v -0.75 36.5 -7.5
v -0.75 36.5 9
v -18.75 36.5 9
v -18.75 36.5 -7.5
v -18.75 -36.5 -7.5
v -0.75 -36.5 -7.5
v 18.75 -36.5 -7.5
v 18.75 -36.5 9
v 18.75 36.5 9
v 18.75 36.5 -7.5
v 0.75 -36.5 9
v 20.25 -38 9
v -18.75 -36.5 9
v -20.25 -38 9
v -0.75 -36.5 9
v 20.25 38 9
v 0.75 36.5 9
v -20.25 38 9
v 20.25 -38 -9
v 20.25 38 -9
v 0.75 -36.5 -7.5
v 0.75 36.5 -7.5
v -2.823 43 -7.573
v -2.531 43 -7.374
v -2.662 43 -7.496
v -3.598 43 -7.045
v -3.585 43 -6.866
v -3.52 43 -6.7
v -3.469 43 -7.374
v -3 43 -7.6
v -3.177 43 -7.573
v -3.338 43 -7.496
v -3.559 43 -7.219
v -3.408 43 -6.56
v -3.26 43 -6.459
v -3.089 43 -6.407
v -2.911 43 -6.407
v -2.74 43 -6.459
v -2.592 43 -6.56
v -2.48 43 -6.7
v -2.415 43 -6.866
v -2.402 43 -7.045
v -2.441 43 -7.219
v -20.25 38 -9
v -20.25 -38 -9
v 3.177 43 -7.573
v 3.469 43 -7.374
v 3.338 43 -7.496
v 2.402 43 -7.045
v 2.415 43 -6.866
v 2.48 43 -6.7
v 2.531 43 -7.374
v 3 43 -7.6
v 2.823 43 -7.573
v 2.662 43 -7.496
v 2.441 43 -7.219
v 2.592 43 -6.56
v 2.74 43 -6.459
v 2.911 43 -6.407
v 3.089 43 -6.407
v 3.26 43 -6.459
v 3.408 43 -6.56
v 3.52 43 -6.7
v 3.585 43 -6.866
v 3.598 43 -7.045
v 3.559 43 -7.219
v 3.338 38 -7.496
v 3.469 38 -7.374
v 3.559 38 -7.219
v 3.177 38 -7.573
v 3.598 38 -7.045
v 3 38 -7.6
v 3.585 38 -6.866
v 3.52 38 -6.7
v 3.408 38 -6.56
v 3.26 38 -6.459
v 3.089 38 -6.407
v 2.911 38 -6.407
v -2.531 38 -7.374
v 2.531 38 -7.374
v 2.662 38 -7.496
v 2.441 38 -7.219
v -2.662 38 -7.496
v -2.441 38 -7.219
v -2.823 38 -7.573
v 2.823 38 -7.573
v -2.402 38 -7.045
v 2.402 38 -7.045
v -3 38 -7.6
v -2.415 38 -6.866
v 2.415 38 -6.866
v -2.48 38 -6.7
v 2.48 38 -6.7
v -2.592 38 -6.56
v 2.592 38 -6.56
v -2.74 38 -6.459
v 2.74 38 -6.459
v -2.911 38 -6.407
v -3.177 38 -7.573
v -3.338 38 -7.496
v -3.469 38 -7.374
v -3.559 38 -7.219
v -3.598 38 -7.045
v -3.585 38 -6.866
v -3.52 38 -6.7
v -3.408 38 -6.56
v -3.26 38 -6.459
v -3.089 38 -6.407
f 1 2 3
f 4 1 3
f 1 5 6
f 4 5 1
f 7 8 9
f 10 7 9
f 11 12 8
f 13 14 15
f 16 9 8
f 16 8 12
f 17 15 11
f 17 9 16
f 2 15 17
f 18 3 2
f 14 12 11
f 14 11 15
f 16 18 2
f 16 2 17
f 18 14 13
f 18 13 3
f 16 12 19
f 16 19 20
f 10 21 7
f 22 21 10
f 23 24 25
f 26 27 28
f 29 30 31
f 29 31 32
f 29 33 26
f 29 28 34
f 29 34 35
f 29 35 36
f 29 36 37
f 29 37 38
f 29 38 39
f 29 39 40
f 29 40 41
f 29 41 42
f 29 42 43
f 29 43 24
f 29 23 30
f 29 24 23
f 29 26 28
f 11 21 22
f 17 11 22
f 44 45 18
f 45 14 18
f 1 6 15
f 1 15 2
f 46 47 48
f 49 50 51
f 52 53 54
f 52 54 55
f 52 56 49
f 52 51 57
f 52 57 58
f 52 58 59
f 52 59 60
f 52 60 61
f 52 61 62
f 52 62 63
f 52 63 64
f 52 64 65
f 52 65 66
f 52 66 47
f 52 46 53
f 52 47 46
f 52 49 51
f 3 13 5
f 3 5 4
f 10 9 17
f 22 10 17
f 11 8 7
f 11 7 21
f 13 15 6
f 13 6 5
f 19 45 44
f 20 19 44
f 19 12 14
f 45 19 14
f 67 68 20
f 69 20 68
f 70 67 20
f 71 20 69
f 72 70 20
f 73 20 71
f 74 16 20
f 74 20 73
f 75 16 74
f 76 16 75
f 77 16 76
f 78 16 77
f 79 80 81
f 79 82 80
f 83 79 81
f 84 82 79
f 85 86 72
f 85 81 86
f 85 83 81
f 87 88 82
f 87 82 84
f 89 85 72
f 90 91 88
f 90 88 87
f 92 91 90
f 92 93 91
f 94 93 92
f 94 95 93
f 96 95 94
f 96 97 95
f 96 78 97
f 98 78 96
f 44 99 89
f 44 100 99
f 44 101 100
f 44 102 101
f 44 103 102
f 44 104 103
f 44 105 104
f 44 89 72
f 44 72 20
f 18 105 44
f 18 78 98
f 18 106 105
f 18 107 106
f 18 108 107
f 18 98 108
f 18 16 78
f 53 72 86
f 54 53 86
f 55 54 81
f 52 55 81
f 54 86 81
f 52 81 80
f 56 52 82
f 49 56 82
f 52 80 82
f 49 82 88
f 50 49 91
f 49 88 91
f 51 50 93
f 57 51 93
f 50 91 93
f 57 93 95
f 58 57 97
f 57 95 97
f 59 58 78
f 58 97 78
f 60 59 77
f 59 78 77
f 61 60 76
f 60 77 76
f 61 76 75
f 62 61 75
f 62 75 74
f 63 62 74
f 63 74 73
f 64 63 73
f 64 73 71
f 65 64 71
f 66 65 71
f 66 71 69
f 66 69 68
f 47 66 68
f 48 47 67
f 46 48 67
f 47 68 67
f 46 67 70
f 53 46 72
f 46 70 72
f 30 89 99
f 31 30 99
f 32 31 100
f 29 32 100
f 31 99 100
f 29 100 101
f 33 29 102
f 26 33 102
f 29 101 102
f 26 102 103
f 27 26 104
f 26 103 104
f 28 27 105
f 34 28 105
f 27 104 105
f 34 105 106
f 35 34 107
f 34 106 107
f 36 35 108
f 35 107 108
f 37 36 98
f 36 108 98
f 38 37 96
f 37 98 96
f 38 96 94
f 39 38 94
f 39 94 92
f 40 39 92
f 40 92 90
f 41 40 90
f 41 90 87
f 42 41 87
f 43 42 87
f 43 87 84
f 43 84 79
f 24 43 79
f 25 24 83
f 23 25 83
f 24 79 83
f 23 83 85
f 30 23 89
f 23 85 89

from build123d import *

# Parameters (mm, degrees)
SKETCH1_W           = 76
SKETCH1_H           = 40.5
BOSS_EXTRUDE1_DEPTH = 9
SHELL1_T            = -1.5
SKETCH2_W           = 1.5
SKETCH2_H           = 73
BOSS_EXTRUDE2_DEPTH = 16.5
SKETCH3_R           = 0.6
BOSS_EXTRUDE3_DEPTH = 5


with BuildPart() as part:
    # Sketch1 → Boss-Extrude1 (new, symmetric)
    with BuildSketch(Plane(origin=(0, 0, 0), x_dir=(0, 1, 0), z_dir=(0, 0, 1))):
        Rectangle(SKETCH1_W, SKETCH1_H)
    extrude(amount=BOSS_EXTRUDE1_DEPTH, both=True)

    # Shell1
    shell1_openings = [part.faces().sort_by_distance(p)[0] for p in [
        (0, 0, 9),
    ]]
    offset(amount=SHELL1_T, openings=shell1_openings, kind=Kind.INTERSECTION)

    # Sketch2 → Boss-Extrude2 (add)
    with BuildSketch(Plane.XY.offset(-7.5)):
        Rectangle(SKETCH2_W, SKETCH2_H)
    extrude(amount=BOSS_EXTRUDE2_DEPTH)

    # Sketch3 → Boss-Extrude3 (add)
    with BuildSketch(Plane(origin=(0, 38, 0), x_dir=(-1, 0, 0), z_dir=(0, 1, 0))):
        with Locations(Location((3, -7, 0), (0, 0, 270))):
            Circle(SKETCH3_R)
        with Locations(Location((-3, -7, 0), (0, 0, 270))):
            Circle(SKETCH3_R)
    extrude(amount=BOSS_EXTRUDE3_DEPTH)


solid = part.part
